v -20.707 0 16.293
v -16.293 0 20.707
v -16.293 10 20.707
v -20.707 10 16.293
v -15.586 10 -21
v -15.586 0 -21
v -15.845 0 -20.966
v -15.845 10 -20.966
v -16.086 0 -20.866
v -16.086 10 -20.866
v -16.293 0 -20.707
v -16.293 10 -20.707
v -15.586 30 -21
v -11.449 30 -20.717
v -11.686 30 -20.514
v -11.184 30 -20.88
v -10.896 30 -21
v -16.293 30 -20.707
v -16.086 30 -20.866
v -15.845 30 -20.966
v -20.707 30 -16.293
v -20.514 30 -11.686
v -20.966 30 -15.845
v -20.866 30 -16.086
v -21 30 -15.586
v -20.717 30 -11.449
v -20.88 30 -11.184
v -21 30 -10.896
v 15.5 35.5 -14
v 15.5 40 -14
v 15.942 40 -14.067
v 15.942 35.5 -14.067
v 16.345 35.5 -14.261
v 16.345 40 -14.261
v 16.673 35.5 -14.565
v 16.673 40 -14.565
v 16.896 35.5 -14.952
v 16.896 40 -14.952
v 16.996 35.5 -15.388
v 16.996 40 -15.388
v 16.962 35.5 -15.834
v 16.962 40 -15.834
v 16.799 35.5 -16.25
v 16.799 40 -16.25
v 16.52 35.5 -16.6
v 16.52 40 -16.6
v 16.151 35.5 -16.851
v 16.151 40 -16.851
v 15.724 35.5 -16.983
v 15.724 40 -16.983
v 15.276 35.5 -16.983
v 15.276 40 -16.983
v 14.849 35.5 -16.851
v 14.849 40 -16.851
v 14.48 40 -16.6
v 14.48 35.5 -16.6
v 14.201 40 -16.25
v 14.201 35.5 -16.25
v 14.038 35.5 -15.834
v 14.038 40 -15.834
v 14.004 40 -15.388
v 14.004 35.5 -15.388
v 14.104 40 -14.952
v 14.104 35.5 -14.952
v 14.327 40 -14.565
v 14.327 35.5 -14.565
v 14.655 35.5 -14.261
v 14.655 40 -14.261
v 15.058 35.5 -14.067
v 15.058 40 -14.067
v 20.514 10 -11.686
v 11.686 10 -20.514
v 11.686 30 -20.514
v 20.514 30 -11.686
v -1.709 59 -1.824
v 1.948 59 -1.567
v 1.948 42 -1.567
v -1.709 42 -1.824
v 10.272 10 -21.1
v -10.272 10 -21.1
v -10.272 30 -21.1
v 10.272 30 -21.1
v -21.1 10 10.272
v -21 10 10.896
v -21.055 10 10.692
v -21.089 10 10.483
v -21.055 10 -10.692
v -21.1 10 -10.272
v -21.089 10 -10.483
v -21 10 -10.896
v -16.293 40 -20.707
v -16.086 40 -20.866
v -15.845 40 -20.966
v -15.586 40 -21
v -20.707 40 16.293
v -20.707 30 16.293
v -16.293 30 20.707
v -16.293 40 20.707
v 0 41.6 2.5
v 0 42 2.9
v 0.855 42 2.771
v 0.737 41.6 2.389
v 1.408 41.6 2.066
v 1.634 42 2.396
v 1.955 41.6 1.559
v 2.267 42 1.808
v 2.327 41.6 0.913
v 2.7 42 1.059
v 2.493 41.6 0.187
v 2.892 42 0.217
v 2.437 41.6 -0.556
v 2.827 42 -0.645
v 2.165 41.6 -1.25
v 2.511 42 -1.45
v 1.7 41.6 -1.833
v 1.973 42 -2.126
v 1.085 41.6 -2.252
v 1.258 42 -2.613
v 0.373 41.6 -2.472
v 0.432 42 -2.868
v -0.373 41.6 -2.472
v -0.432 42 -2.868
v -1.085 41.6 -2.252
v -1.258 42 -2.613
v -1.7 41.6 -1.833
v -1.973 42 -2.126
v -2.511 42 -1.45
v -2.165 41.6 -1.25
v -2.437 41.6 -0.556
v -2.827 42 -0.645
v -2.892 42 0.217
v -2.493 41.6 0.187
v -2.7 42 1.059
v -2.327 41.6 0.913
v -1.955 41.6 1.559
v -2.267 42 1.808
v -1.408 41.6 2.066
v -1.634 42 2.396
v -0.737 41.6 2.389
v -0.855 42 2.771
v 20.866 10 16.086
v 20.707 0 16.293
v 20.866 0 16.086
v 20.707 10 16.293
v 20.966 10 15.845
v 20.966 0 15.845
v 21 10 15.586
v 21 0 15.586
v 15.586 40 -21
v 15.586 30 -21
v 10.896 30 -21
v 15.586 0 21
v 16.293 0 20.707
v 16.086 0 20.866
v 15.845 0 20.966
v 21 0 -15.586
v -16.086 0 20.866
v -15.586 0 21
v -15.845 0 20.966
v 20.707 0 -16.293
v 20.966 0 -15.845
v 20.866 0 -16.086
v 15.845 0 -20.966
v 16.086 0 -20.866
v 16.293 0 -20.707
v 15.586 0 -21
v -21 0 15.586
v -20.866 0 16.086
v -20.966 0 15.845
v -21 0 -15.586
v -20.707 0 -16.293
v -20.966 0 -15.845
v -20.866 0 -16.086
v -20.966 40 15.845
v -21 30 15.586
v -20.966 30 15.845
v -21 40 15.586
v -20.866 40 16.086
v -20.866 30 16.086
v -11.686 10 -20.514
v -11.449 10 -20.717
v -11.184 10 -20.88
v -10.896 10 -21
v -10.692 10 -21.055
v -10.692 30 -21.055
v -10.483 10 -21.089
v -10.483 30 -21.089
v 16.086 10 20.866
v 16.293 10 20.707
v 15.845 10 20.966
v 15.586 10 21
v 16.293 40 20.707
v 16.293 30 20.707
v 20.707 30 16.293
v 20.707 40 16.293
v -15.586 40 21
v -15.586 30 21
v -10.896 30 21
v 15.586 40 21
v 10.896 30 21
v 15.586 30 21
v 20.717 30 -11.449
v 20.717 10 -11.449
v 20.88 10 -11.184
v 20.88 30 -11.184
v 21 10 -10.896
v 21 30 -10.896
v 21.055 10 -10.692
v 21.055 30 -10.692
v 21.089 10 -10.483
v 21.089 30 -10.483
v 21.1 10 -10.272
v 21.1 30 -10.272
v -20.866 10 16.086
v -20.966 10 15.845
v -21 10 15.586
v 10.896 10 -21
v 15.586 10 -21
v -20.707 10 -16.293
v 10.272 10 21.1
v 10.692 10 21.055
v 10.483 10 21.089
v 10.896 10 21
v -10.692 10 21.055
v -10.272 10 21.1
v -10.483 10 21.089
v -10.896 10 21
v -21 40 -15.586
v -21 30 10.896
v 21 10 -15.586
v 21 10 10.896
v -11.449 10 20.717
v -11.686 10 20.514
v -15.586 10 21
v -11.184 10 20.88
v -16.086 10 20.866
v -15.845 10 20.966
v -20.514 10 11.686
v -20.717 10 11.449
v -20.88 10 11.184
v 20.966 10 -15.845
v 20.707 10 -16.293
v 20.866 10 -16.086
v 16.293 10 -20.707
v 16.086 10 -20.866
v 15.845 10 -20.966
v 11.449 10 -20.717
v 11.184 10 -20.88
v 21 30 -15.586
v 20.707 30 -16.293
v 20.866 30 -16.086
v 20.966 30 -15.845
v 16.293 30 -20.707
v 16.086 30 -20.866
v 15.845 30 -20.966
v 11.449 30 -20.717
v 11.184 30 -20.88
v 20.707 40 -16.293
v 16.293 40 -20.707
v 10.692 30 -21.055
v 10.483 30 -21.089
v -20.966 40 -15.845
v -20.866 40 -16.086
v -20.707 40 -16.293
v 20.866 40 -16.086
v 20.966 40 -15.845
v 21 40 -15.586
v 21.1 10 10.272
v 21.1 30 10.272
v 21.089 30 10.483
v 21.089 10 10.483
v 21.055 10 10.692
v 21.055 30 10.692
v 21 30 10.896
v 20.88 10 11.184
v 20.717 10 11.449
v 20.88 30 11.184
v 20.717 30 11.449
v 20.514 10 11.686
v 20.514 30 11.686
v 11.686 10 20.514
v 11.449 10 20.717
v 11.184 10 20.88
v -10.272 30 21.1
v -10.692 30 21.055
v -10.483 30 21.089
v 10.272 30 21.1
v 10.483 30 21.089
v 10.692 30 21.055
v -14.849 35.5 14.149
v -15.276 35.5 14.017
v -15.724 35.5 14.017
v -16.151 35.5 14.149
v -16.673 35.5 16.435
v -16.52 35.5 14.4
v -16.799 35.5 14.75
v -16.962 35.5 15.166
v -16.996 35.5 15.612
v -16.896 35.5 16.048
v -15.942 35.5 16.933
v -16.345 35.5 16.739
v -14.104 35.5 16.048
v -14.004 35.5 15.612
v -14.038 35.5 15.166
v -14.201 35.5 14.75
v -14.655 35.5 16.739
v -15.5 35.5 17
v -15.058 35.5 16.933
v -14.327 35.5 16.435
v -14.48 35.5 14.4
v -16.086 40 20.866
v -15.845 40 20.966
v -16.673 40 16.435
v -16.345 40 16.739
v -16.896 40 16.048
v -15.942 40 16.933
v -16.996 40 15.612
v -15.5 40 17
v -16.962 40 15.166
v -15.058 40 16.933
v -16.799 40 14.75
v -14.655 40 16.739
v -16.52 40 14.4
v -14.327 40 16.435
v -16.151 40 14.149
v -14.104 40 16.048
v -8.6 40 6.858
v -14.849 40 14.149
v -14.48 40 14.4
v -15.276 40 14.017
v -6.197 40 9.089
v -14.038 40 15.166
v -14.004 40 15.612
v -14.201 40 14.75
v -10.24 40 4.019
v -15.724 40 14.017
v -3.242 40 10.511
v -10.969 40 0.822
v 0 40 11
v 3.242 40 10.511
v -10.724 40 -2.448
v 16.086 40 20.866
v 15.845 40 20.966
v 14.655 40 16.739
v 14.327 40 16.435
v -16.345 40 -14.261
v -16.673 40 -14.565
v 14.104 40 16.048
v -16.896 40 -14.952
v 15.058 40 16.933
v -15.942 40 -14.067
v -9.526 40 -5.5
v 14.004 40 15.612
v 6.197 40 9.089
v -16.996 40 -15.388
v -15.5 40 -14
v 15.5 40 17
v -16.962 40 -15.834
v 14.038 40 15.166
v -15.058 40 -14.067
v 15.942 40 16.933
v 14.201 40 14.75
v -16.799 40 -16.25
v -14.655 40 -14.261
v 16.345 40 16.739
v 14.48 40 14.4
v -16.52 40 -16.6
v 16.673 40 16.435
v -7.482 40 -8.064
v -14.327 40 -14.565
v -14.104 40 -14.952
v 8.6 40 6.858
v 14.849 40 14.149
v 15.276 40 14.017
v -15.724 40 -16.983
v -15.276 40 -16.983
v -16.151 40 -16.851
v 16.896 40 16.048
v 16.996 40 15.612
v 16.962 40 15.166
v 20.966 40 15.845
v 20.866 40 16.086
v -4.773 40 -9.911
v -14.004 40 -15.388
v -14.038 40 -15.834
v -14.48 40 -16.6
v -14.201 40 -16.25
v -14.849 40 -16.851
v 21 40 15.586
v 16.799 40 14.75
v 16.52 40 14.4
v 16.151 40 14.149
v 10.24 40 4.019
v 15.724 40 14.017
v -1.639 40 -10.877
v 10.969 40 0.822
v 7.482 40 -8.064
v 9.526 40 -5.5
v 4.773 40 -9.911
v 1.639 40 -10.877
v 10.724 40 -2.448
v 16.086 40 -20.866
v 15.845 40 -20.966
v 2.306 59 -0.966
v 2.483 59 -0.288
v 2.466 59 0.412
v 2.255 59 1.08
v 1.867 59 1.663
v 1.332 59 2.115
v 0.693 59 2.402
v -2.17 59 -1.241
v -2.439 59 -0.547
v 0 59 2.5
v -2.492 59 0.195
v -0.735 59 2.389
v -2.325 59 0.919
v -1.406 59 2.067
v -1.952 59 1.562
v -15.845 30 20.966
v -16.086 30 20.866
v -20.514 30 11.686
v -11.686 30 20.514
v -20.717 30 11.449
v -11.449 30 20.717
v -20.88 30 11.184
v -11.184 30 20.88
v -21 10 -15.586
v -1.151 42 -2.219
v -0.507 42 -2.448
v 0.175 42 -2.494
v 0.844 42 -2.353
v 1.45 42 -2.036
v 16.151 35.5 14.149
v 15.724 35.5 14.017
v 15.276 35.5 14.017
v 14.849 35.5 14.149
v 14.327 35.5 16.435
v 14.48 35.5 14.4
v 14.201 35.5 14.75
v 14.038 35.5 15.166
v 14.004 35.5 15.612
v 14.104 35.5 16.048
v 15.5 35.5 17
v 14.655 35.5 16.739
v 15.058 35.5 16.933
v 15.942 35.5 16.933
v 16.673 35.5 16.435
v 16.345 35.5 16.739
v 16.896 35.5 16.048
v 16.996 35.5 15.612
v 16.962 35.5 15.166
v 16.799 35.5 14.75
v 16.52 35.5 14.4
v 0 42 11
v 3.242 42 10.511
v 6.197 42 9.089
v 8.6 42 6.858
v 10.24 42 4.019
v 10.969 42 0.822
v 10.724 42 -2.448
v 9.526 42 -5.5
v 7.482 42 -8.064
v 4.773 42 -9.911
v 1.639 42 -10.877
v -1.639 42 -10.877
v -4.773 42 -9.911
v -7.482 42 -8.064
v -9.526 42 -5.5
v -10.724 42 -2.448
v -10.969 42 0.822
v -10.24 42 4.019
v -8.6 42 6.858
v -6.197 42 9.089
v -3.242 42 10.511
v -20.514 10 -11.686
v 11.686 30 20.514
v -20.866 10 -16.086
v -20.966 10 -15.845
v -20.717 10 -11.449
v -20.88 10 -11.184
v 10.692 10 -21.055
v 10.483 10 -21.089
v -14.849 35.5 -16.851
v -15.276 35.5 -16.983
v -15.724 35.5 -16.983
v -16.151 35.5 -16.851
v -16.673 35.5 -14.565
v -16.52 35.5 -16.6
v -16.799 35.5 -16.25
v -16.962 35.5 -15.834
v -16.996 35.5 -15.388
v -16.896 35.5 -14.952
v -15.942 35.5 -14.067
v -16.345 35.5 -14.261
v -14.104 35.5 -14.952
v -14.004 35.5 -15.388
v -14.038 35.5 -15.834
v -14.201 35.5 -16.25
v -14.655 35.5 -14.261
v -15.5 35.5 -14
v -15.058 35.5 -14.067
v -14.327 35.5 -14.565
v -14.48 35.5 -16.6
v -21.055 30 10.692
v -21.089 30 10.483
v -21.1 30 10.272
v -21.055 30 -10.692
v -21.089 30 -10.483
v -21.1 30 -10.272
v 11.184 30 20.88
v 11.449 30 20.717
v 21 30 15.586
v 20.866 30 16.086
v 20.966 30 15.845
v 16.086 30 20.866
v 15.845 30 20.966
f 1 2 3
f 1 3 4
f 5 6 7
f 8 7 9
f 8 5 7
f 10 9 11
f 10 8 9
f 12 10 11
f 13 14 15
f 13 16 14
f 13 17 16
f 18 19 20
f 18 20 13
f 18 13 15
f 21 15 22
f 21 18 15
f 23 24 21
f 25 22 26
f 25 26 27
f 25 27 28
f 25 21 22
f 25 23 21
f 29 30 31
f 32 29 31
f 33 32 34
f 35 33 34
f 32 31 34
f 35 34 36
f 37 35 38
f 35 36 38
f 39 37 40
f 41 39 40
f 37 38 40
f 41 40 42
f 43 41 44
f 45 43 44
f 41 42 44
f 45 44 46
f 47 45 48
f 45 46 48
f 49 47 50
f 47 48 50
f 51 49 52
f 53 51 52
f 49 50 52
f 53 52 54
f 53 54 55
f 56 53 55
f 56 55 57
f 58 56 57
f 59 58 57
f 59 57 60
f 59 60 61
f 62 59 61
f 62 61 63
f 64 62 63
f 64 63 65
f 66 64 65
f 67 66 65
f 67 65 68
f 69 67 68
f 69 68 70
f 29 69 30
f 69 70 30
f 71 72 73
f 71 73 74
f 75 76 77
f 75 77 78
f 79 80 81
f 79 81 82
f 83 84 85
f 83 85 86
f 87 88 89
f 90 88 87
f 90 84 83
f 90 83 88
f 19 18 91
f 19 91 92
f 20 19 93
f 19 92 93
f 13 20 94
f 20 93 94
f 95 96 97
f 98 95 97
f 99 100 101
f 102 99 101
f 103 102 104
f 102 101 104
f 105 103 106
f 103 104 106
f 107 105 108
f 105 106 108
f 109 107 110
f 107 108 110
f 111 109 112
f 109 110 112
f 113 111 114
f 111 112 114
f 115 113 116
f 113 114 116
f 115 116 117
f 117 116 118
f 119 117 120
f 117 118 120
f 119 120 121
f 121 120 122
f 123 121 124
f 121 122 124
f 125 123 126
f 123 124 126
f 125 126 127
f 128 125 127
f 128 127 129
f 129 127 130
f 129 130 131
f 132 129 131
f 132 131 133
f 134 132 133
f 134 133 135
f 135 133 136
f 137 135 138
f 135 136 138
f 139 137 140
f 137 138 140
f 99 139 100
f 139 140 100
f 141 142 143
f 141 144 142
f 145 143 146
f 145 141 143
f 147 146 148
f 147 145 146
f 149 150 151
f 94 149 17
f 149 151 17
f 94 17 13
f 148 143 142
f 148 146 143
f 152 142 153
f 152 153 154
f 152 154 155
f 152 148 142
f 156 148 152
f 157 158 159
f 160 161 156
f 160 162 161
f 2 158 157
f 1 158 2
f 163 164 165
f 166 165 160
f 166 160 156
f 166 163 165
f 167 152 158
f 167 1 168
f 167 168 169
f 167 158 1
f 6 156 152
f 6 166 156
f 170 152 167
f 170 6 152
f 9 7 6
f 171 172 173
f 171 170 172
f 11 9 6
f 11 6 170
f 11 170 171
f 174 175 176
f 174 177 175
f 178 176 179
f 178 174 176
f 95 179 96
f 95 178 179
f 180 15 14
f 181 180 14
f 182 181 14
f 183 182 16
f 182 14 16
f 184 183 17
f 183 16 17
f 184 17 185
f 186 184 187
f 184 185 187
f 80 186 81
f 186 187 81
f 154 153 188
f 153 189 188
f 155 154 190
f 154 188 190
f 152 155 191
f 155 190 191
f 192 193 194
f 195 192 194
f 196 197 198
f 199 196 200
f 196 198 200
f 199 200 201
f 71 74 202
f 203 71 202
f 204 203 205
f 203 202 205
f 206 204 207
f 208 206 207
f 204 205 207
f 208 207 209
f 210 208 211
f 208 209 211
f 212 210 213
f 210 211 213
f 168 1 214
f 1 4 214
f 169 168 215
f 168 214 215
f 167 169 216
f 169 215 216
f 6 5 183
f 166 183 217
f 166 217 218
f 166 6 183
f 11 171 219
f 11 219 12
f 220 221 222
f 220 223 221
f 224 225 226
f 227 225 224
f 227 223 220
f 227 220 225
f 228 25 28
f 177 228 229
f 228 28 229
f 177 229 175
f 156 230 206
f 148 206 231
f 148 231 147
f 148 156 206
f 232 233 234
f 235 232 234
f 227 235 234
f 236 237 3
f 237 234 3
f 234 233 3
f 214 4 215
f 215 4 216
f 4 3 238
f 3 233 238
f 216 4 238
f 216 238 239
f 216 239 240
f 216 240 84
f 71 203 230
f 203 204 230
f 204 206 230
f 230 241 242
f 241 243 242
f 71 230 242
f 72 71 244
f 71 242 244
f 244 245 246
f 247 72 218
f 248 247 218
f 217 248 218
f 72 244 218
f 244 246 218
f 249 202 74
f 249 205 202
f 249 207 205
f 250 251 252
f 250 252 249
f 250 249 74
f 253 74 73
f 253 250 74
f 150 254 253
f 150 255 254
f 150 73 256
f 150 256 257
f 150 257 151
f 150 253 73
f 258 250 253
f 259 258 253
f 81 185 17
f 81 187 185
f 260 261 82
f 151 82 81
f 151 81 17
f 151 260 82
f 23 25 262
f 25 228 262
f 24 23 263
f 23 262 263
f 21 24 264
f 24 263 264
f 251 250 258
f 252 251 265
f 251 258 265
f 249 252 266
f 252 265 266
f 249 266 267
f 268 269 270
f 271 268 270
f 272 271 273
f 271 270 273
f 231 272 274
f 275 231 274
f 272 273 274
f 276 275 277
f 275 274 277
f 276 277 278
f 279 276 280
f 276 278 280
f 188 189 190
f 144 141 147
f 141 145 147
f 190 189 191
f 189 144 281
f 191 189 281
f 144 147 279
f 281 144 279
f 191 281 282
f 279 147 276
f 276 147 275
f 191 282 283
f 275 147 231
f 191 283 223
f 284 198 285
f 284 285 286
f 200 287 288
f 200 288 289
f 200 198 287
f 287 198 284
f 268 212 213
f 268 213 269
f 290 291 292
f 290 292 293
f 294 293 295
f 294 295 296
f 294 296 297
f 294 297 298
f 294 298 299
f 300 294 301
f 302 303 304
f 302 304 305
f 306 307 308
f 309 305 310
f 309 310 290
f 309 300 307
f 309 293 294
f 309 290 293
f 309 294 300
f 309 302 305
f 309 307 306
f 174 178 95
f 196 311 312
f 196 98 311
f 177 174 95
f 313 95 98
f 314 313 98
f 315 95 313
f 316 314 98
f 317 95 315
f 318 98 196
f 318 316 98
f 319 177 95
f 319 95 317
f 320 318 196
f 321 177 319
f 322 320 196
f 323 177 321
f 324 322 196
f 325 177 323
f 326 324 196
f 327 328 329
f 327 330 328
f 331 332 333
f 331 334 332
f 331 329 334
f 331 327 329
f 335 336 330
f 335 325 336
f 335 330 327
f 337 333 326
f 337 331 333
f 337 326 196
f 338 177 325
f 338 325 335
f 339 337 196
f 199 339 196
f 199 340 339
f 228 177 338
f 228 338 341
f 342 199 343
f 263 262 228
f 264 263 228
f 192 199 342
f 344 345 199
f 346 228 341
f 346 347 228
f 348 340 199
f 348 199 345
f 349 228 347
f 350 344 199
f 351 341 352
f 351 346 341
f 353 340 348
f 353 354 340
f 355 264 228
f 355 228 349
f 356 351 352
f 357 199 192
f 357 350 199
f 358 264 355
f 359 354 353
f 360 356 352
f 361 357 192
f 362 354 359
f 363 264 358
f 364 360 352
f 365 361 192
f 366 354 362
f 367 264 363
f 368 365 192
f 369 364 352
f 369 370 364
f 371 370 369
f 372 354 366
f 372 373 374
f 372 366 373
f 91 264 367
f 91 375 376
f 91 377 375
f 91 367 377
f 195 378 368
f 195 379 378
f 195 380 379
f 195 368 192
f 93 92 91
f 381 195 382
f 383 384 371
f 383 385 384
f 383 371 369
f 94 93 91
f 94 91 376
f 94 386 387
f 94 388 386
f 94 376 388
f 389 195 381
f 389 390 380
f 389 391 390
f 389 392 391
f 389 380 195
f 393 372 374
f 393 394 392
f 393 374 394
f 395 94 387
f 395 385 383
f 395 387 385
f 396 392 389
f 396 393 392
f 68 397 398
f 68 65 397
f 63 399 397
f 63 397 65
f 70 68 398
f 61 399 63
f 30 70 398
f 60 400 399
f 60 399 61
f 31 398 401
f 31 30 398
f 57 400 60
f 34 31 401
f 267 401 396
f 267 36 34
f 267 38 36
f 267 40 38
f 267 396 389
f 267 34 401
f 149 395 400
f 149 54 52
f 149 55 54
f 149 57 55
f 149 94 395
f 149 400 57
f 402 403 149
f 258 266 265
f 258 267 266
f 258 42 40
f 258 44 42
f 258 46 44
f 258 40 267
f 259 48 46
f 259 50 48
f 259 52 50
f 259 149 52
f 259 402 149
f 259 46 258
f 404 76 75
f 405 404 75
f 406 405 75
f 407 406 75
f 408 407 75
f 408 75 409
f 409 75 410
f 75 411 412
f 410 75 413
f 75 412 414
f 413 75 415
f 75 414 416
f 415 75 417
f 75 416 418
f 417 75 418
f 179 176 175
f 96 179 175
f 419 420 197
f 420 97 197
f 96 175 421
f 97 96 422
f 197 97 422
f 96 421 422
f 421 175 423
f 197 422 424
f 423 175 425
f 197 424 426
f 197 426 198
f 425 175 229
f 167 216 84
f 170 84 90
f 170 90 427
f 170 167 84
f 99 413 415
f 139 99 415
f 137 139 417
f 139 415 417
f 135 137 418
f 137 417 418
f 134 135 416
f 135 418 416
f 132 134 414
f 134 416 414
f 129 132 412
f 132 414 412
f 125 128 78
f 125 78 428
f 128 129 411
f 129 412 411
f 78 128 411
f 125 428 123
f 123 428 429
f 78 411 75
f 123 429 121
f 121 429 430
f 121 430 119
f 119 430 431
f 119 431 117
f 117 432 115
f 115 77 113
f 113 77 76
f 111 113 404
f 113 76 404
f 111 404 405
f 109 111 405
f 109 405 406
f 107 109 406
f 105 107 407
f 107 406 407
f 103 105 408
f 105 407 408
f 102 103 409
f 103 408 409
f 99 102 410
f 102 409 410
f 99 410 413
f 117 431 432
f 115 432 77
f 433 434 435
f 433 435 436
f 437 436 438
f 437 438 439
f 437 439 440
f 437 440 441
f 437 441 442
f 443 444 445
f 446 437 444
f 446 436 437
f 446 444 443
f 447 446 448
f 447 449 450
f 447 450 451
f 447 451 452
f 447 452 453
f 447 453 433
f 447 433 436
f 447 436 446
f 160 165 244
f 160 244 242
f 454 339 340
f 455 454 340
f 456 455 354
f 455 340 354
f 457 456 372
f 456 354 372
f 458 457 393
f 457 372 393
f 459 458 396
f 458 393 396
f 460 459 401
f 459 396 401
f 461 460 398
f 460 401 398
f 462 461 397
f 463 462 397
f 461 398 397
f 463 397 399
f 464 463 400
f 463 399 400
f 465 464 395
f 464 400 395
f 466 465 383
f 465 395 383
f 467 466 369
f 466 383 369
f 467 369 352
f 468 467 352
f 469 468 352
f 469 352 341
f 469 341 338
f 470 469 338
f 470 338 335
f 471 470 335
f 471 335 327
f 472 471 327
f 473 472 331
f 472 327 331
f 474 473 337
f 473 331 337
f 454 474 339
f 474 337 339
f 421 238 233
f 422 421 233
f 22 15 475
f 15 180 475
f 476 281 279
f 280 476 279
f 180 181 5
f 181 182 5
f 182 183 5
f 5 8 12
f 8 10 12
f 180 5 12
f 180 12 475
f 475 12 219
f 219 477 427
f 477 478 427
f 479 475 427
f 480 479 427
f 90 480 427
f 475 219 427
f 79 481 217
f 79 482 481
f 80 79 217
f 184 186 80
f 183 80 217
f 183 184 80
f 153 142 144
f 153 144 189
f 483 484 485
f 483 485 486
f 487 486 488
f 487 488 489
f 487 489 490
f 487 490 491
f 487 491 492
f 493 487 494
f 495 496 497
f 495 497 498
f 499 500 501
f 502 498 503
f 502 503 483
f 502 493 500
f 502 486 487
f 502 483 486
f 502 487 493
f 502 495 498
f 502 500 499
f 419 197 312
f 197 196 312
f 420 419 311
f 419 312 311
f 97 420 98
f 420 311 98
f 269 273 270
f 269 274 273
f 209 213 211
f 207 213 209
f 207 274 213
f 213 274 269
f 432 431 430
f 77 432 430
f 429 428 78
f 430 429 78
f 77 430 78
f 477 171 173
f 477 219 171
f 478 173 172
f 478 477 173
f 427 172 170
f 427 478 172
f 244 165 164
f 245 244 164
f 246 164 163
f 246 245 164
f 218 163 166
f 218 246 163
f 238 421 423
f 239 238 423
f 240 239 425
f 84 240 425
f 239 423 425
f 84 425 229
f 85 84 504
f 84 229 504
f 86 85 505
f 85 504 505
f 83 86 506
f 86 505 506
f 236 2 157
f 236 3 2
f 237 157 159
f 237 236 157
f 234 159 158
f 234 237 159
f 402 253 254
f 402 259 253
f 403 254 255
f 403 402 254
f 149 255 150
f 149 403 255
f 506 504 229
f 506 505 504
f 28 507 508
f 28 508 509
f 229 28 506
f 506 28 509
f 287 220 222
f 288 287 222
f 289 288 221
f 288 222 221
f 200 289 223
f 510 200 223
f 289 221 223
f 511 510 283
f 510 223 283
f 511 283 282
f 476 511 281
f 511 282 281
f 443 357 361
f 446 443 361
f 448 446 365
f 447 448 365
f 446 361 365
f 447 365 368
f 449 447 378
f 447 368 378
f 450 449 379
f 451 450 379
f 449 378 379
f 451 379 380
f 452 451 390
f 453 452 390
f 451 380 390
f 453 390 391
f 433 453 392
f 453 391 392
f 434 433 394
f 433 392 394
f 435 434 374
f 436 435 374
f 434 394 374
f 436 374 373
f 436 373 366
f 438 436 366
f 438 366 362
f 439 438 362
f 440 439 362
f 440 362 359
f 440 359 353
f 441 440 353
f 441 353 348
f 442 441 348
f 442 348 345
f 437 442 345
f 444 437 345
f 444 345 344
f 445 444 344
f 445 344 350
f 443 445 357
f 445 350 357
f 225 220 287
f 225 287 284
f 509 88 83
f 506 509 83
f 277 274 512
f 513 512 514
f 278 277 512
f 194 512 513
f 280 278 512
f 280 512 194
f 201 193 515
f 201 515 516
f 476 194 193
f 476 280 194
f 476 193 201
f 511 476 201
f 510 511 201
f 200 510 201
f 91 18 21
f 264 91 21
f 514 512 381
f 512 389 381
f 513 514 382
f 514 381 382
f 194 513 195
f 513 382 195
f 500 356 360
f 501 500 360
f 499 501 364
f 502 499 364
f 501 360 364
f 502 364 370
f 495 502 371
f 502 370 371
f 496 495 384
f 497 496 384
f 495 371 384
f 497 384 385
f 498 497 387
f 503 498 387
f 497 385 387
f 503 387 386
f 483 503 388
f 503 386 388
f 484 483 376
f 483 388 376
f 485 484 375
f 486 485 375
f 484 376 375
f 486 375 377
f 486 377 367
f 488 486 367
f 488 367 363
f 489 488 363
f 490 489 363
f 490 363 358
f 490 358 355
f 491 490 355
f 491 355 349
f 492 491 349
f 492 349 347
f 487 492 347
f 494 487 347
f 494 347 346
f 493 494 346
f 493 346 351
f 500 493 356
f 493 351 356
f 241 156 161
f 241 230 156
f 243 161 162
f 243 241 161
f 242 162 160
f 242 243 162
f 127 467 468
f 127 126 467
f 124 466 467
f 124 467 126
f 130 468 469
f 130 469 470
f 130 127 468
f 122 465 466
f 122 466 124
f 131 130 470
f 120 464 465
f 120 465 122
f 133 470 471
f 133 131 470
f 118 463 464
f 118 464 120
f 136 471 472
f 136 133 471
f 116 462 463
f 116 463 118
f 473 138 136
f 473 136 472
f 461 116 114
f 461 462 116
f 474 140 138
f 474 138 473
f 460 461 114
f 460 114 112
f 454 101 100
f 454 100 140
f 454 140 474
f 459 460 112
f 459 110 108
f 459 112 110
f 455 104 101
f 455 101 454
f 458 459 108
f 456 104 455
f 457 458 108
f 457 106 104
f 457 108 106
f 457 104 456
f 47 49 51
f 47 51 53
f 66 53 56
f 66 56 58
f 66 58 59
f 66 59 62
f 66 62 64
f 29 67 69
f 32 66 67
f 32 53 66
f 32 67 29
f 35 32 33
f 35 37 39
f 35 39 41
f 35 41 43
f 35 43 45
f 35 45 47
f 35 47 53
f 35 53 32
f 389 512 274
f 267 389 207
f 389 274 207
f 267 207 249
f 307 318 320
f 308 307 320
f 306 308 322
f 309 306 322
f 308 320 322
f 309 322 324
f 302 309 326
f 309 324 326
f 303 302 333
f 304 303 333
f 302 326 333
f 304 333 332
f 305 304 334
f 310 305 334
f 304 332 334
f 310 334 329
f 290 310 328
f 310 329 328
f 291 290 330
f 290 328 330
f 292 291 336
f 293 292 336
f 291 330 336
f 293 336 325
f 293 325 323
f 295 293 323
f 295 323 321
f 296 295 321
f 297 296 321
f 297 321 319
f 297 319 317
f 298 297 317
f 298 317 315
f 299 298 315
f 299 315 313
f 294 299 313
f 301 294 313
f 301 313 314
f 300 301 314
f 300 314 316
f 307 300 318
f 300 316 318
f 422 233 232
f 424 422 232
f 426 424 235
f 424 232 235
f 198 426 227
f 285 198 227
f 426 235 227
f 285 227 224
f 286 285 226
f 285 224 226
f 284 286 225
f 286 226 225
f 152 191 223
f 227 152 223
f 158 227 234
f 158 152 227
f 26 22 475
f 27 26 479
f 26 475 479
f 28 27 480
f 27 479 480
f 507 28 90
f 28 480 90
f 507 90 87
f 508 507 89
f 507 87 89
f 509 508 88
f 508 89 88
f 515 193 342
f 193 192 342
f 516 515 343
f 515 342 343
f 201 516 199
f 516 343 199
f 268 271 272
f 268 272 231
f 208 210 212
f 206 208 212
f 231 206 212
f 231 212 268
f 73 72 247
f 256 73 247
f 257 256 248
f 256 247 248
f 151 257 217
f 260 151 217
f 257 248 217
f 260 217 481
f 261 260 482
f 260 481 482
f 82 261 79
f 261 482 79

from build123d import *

# Parameters (mm, degrees)
BOSS_EXTRUDE1_DEPTH = 10
BOSS_EXTRUDE2_DEPTH = 10
MIRROR1_START       = 20
MIRROR1_DEPTH       = 20
MIRROR1_START_2     = 30
MIRROR1_2_DEPTH     = 10
MIRROR1_3_DEPTH     = 10
FILLET1_R           = 2
FILLET2_R           = 1
SKETCH3_R           = 11
BOSS_EXTRUDE3_DEPTH = 2
SKETCH4_R           = 1.5
CUT_EXTRUDE1_DEPTH  = 4.5
SKETCH5_R           = 2.5
CUT_EXTRUDE3_DEPTH  = 52.521063654
CHAMFER3_SIZE       = 0.4
BOSS_EXTRUDE4_START = -59
SKETCH6_R           = 2.5
BOSS_EXTRUDE4_DEPTH = 59
CUT_EXTRUDE8_DEPTH  = 17


# Read off the part's stored shape, not the designer's step: Mirror1
with BuildPart() as part:
    # Sketch1 → Boss-Extrude1 (new body)
    with BuildSketch(Plane(origin=(0, 0, 0), x_dir=(1, 0, 0), z_dir=(0, 1, 0))):
        Polygon((-21, 16), (-16, 21), (16, 21), (21, 16), (21, -16), (16, -21), (-16, -21), (-21, -16), align=None)
    extrude(amount=BOSS_EXTRUDE1_DEPTH)

    # Sketch2 → Boss-Extrude2 (add)
    with BuildSketch(Plane(origin=(0, 10, 0), x_dir=(1, 0, 0), z_dir=(0, 1, 0))):
        Polygon((-21.1, 11.1), (-11.1, 21.1), (11.1, 21.1), (21.1, 11.1), (21.1, -11.1), (11.1, -21.1), (-11.1, -21.1), (-21.1, -11.1), align=None)
    extrude(amount=BOSS_EXTRUDE2_DEPTH)

    # Mirror1 outline → Mirror1 (add)
    with BuildSketch(Plane(origin=(0, 0, 0), x_dir=(1, 0, 0), z_dir=(0, 1, 0)).offset(MIRROR1_START)):
        Polygon((-21, 11.2), (-21, -11.2), (-11.2, -21), (11.2, -21), (21, -11.2), (21, 11.2), (11.2, 21), (-11.2, 21), align=None)
    extrude(amount=MIRROR1_DEPTH)

    # Mirror1 2 outline → Mirror1 2 (add)
    with BuildSketch(Plane(origin=(0, 0, 0), x_dir=(1, 0, 0), z_dir=(0, 1, 0)).offset(MIRROR1_START_2)):
        Polygon((-21, -11.2), (-21, -16), (-16, -21), (-11.2, -21), align=None)
        Polygon((-21, 16), (-21, 11.2), (-11.2, 21), (-16, 21), align=None)
        Polygon((21, -11.2), (11.2, -21), (16, -21), (21, -16), align=None)
        Polygon((16, 21), (11.2, 21), (21, 11.2), (21, 16), align=None)
    extrude(amount=MIRROR1_2_DEPTH)

    # Mirror1 3 outline → Mirror1 3 (add)
    with BuildSketch(Plane(origin=(0, 0, 0), x_dir=(1, 0, 0), z_dir=(0, 1, 0)).offset(MIRROR1_START)):
        Polygon((-21.1, -11.1), (-21, -11.2), (-21, 11.2), (-21.1, 11.1), align=None)
        Polygon((11.2, -21), (-11.2, -21), (-11.1, -21.1), (11.1, -21.1), align=None)
        Polygon((-11.1, 21.1), (-11.2, 21), (11.2, 21), (11.1, 21.1), align=None)
        Polygon((21, 11.2), (21, -11.2), (21.1, -11.1), (21.1, 11.1), align=None)
    extrude(amount=MIRROR1_3_DEPTH)

    # Fillet1
    # the kernel refuses this fillet: 2 mm, written as the material it takes off along each edge
    with BuildSketch(Plane(origin=(11.1, 10, -21.1), x_dir=(0.7071067811865497, 0, 0.7071067811865454), z_dir=(0, 1, 0)), Plane(origin=(-11.1, 30, -21.1), x_dir=(-0.707106781186553, 0, 0.7071067811865422), z_dir=(0, -1, 0)), Plane(origin=(-21.1, 10, -11.1), x_dir=(0.7071067811865487, 0, -0.7071067811865465), z_dir=(0, 1, 0)), Plane(origin=(-21.1, 30, 11.1), x_dir=(0.7071067811865239, 1.1932702685997172e-15, 0.7071067811865711), z_dir=(0, -1, 0)), Plane(origin=(-11.1, 10, 21.1), x_dir=(-0.7071067811865497, 0, -0.7071067811865454), z_dir=(0, 1, 0)), Plane(origin=(21.1, 30, -11.1), x_dir=(-0.7071067811865326, 1.3816813636417406e-15, -0.7071067811865626), z_dir=(0, -1, 0))) as fillet1_piece_1:
        with BuildLine():
            CenterArc((FILLET1_R * 0.414213562373, -FILLET1_R), FILLET1_R, 90, 45)
            Line((-FILLET1_R * 0.292893218813, -FILLET1_R * 0.292893218813), (0, 0))
            Line((0, 0), (FILLET1_R * 0.414213562373, 0))
        make_face()
    extrude(amount=20, mode=Mode.SUBTRACT)
    with BuildSketch(Plane(origin=(11.1, 10, 21.1), x_dir=(0.7071067811865465, 0, -0.7071067811865487), z_dir=(0, 1, 0)), Plane(origin=(21.1, 30, 11.1), x_dir=(-0.7071067811865475, 0, 0.7071067811865475), z_dir=(0, -1, 0))) as fillet1_piece_2:
        with BuildLine():
            CenterArc((FILLET1_R * 0.414213562373, FILLET1_R), FILLET1_R, 225, 45)
            Line((-FILLET1_R * 0.292893218813, FILLET1_R * 0.292893218813), (0, 0))
            Line((0, 0), (FILLET1_R * 0.414213562373, 0))
        make_face()
    extrude(amount=20, mode=Mode.SUBTRACT)

    # Fillet2
    fillet2_edges = [part.edges().sort_by_distance(p)[0] for p in [
        (-21, 5, -16),
        (-16, 5, -21),
        (16, 5, -21),
        (21, 5, -16),
        (21, 5, 16),
        (16, 5, 21),
        (-16, 5, 21),
        (-21, 5, 16),
        (-21, 35, 16),
        (-16, 35, 21),
        (16, 35, 21),
        (21, 35, 16),
        (21, 35, -16),
        (16, 35, -21),
        (-16, 35, -21),
        (-21, 35, -16),
    ]]
    fillet(fillet2_edges, radius=FILLET2_R)

    # Sketch3 → Boss-Extrude3 (add)
    with BuildSketch(Plane(origin=(0, 40, 0), x_dir=(1, 0, 0), z_dir=(0, 1, 0))):
        with Locations(Location((0, 0, 0), (0, 0, 270))):
            Circle(SKETCH3_R)
    extrude(amount=BOSS_EXTRUDE3_DEPTH)

    # Sketch4 → Cut-Extrude1 (cut)
    with BuildSketch(Plane(origin=(0, 40, 0), x_dir=(1, 0, 0), z_dir=(0, 1, 0))):
        with Locations(Location((-15.5, 15.5, 0), (0, 0, 270))):
            Circle(SKETCH4_R)
        with Locations(Location((15.5, 15.5, 0), (0, 0, 270))):
            Circle(SKETCH4_R)
        with Locations(Location((15.5, -15.5, 0), (0, 0, 270))):
            Circle(SKETCH4_R)
        with Locations(Location((-15.5, -15.5, 0), (0, 0, 270))):
            Circle(SKETCH4_R)
    extrude(amount=-CUT_EXTRUDE1_DEPTH, mode=Mode.SUBTRACT)

    # Sketch5 → Cut-Extrude3 (cut, through all)
    with BuildSketch(Plane(origin=(0, 42, 0), x_dir=(1, 0, 0), z_dir=(0, 1, 0))):
        with Locations(Location((0, 0, 0), (0, 0, 270))):
            Circle(SKETCH5_R)
    extrude(amount=-CUT_EXTRUDE3_DEPTH, mode=Mode.SUBTRACT)

    # Chamfer3
    chamfer3_edges = [part.edges().sort_by_distance(p)[0] for p in [
        (0, 42, -2.5),
    ]]
    chamfer(chamfer3_edges, length=CHAMFER3_SIZE)

    # Sketch6 → Boss-Extrude4 (add)
    with BuildSketch(Plane.XZ.offset(BOSS_EXTRUDE4_START)):
        with Locations(Location((0, 0, 0), (0, 0, 90))):
            Circle(SKETCH6_R)
    extrude(amount=BOSS_EXTRUDE4_DEPTH)

    # Sketch7 → Cut-Extrude8 (cut)
    with BuildSketch(Plane(origin=(0, 59, 0), x_dir=(1, 0, 0), z_dir=(0, 1, 0))):
        with BuildLine():
            Line((1.947589111, 1.567449092), (-1.709469516, 1.824202284))
            ThreePointArc((-1.709469516, 1.824202284), (0.175087938, 2.493861306), (1.947589111, 1.567449092))
        make_face()
    extrude(amount=-CUT_EXTRUDE8_DEPTH, mode=Mode.SUBTRACT)


solid = part.part
